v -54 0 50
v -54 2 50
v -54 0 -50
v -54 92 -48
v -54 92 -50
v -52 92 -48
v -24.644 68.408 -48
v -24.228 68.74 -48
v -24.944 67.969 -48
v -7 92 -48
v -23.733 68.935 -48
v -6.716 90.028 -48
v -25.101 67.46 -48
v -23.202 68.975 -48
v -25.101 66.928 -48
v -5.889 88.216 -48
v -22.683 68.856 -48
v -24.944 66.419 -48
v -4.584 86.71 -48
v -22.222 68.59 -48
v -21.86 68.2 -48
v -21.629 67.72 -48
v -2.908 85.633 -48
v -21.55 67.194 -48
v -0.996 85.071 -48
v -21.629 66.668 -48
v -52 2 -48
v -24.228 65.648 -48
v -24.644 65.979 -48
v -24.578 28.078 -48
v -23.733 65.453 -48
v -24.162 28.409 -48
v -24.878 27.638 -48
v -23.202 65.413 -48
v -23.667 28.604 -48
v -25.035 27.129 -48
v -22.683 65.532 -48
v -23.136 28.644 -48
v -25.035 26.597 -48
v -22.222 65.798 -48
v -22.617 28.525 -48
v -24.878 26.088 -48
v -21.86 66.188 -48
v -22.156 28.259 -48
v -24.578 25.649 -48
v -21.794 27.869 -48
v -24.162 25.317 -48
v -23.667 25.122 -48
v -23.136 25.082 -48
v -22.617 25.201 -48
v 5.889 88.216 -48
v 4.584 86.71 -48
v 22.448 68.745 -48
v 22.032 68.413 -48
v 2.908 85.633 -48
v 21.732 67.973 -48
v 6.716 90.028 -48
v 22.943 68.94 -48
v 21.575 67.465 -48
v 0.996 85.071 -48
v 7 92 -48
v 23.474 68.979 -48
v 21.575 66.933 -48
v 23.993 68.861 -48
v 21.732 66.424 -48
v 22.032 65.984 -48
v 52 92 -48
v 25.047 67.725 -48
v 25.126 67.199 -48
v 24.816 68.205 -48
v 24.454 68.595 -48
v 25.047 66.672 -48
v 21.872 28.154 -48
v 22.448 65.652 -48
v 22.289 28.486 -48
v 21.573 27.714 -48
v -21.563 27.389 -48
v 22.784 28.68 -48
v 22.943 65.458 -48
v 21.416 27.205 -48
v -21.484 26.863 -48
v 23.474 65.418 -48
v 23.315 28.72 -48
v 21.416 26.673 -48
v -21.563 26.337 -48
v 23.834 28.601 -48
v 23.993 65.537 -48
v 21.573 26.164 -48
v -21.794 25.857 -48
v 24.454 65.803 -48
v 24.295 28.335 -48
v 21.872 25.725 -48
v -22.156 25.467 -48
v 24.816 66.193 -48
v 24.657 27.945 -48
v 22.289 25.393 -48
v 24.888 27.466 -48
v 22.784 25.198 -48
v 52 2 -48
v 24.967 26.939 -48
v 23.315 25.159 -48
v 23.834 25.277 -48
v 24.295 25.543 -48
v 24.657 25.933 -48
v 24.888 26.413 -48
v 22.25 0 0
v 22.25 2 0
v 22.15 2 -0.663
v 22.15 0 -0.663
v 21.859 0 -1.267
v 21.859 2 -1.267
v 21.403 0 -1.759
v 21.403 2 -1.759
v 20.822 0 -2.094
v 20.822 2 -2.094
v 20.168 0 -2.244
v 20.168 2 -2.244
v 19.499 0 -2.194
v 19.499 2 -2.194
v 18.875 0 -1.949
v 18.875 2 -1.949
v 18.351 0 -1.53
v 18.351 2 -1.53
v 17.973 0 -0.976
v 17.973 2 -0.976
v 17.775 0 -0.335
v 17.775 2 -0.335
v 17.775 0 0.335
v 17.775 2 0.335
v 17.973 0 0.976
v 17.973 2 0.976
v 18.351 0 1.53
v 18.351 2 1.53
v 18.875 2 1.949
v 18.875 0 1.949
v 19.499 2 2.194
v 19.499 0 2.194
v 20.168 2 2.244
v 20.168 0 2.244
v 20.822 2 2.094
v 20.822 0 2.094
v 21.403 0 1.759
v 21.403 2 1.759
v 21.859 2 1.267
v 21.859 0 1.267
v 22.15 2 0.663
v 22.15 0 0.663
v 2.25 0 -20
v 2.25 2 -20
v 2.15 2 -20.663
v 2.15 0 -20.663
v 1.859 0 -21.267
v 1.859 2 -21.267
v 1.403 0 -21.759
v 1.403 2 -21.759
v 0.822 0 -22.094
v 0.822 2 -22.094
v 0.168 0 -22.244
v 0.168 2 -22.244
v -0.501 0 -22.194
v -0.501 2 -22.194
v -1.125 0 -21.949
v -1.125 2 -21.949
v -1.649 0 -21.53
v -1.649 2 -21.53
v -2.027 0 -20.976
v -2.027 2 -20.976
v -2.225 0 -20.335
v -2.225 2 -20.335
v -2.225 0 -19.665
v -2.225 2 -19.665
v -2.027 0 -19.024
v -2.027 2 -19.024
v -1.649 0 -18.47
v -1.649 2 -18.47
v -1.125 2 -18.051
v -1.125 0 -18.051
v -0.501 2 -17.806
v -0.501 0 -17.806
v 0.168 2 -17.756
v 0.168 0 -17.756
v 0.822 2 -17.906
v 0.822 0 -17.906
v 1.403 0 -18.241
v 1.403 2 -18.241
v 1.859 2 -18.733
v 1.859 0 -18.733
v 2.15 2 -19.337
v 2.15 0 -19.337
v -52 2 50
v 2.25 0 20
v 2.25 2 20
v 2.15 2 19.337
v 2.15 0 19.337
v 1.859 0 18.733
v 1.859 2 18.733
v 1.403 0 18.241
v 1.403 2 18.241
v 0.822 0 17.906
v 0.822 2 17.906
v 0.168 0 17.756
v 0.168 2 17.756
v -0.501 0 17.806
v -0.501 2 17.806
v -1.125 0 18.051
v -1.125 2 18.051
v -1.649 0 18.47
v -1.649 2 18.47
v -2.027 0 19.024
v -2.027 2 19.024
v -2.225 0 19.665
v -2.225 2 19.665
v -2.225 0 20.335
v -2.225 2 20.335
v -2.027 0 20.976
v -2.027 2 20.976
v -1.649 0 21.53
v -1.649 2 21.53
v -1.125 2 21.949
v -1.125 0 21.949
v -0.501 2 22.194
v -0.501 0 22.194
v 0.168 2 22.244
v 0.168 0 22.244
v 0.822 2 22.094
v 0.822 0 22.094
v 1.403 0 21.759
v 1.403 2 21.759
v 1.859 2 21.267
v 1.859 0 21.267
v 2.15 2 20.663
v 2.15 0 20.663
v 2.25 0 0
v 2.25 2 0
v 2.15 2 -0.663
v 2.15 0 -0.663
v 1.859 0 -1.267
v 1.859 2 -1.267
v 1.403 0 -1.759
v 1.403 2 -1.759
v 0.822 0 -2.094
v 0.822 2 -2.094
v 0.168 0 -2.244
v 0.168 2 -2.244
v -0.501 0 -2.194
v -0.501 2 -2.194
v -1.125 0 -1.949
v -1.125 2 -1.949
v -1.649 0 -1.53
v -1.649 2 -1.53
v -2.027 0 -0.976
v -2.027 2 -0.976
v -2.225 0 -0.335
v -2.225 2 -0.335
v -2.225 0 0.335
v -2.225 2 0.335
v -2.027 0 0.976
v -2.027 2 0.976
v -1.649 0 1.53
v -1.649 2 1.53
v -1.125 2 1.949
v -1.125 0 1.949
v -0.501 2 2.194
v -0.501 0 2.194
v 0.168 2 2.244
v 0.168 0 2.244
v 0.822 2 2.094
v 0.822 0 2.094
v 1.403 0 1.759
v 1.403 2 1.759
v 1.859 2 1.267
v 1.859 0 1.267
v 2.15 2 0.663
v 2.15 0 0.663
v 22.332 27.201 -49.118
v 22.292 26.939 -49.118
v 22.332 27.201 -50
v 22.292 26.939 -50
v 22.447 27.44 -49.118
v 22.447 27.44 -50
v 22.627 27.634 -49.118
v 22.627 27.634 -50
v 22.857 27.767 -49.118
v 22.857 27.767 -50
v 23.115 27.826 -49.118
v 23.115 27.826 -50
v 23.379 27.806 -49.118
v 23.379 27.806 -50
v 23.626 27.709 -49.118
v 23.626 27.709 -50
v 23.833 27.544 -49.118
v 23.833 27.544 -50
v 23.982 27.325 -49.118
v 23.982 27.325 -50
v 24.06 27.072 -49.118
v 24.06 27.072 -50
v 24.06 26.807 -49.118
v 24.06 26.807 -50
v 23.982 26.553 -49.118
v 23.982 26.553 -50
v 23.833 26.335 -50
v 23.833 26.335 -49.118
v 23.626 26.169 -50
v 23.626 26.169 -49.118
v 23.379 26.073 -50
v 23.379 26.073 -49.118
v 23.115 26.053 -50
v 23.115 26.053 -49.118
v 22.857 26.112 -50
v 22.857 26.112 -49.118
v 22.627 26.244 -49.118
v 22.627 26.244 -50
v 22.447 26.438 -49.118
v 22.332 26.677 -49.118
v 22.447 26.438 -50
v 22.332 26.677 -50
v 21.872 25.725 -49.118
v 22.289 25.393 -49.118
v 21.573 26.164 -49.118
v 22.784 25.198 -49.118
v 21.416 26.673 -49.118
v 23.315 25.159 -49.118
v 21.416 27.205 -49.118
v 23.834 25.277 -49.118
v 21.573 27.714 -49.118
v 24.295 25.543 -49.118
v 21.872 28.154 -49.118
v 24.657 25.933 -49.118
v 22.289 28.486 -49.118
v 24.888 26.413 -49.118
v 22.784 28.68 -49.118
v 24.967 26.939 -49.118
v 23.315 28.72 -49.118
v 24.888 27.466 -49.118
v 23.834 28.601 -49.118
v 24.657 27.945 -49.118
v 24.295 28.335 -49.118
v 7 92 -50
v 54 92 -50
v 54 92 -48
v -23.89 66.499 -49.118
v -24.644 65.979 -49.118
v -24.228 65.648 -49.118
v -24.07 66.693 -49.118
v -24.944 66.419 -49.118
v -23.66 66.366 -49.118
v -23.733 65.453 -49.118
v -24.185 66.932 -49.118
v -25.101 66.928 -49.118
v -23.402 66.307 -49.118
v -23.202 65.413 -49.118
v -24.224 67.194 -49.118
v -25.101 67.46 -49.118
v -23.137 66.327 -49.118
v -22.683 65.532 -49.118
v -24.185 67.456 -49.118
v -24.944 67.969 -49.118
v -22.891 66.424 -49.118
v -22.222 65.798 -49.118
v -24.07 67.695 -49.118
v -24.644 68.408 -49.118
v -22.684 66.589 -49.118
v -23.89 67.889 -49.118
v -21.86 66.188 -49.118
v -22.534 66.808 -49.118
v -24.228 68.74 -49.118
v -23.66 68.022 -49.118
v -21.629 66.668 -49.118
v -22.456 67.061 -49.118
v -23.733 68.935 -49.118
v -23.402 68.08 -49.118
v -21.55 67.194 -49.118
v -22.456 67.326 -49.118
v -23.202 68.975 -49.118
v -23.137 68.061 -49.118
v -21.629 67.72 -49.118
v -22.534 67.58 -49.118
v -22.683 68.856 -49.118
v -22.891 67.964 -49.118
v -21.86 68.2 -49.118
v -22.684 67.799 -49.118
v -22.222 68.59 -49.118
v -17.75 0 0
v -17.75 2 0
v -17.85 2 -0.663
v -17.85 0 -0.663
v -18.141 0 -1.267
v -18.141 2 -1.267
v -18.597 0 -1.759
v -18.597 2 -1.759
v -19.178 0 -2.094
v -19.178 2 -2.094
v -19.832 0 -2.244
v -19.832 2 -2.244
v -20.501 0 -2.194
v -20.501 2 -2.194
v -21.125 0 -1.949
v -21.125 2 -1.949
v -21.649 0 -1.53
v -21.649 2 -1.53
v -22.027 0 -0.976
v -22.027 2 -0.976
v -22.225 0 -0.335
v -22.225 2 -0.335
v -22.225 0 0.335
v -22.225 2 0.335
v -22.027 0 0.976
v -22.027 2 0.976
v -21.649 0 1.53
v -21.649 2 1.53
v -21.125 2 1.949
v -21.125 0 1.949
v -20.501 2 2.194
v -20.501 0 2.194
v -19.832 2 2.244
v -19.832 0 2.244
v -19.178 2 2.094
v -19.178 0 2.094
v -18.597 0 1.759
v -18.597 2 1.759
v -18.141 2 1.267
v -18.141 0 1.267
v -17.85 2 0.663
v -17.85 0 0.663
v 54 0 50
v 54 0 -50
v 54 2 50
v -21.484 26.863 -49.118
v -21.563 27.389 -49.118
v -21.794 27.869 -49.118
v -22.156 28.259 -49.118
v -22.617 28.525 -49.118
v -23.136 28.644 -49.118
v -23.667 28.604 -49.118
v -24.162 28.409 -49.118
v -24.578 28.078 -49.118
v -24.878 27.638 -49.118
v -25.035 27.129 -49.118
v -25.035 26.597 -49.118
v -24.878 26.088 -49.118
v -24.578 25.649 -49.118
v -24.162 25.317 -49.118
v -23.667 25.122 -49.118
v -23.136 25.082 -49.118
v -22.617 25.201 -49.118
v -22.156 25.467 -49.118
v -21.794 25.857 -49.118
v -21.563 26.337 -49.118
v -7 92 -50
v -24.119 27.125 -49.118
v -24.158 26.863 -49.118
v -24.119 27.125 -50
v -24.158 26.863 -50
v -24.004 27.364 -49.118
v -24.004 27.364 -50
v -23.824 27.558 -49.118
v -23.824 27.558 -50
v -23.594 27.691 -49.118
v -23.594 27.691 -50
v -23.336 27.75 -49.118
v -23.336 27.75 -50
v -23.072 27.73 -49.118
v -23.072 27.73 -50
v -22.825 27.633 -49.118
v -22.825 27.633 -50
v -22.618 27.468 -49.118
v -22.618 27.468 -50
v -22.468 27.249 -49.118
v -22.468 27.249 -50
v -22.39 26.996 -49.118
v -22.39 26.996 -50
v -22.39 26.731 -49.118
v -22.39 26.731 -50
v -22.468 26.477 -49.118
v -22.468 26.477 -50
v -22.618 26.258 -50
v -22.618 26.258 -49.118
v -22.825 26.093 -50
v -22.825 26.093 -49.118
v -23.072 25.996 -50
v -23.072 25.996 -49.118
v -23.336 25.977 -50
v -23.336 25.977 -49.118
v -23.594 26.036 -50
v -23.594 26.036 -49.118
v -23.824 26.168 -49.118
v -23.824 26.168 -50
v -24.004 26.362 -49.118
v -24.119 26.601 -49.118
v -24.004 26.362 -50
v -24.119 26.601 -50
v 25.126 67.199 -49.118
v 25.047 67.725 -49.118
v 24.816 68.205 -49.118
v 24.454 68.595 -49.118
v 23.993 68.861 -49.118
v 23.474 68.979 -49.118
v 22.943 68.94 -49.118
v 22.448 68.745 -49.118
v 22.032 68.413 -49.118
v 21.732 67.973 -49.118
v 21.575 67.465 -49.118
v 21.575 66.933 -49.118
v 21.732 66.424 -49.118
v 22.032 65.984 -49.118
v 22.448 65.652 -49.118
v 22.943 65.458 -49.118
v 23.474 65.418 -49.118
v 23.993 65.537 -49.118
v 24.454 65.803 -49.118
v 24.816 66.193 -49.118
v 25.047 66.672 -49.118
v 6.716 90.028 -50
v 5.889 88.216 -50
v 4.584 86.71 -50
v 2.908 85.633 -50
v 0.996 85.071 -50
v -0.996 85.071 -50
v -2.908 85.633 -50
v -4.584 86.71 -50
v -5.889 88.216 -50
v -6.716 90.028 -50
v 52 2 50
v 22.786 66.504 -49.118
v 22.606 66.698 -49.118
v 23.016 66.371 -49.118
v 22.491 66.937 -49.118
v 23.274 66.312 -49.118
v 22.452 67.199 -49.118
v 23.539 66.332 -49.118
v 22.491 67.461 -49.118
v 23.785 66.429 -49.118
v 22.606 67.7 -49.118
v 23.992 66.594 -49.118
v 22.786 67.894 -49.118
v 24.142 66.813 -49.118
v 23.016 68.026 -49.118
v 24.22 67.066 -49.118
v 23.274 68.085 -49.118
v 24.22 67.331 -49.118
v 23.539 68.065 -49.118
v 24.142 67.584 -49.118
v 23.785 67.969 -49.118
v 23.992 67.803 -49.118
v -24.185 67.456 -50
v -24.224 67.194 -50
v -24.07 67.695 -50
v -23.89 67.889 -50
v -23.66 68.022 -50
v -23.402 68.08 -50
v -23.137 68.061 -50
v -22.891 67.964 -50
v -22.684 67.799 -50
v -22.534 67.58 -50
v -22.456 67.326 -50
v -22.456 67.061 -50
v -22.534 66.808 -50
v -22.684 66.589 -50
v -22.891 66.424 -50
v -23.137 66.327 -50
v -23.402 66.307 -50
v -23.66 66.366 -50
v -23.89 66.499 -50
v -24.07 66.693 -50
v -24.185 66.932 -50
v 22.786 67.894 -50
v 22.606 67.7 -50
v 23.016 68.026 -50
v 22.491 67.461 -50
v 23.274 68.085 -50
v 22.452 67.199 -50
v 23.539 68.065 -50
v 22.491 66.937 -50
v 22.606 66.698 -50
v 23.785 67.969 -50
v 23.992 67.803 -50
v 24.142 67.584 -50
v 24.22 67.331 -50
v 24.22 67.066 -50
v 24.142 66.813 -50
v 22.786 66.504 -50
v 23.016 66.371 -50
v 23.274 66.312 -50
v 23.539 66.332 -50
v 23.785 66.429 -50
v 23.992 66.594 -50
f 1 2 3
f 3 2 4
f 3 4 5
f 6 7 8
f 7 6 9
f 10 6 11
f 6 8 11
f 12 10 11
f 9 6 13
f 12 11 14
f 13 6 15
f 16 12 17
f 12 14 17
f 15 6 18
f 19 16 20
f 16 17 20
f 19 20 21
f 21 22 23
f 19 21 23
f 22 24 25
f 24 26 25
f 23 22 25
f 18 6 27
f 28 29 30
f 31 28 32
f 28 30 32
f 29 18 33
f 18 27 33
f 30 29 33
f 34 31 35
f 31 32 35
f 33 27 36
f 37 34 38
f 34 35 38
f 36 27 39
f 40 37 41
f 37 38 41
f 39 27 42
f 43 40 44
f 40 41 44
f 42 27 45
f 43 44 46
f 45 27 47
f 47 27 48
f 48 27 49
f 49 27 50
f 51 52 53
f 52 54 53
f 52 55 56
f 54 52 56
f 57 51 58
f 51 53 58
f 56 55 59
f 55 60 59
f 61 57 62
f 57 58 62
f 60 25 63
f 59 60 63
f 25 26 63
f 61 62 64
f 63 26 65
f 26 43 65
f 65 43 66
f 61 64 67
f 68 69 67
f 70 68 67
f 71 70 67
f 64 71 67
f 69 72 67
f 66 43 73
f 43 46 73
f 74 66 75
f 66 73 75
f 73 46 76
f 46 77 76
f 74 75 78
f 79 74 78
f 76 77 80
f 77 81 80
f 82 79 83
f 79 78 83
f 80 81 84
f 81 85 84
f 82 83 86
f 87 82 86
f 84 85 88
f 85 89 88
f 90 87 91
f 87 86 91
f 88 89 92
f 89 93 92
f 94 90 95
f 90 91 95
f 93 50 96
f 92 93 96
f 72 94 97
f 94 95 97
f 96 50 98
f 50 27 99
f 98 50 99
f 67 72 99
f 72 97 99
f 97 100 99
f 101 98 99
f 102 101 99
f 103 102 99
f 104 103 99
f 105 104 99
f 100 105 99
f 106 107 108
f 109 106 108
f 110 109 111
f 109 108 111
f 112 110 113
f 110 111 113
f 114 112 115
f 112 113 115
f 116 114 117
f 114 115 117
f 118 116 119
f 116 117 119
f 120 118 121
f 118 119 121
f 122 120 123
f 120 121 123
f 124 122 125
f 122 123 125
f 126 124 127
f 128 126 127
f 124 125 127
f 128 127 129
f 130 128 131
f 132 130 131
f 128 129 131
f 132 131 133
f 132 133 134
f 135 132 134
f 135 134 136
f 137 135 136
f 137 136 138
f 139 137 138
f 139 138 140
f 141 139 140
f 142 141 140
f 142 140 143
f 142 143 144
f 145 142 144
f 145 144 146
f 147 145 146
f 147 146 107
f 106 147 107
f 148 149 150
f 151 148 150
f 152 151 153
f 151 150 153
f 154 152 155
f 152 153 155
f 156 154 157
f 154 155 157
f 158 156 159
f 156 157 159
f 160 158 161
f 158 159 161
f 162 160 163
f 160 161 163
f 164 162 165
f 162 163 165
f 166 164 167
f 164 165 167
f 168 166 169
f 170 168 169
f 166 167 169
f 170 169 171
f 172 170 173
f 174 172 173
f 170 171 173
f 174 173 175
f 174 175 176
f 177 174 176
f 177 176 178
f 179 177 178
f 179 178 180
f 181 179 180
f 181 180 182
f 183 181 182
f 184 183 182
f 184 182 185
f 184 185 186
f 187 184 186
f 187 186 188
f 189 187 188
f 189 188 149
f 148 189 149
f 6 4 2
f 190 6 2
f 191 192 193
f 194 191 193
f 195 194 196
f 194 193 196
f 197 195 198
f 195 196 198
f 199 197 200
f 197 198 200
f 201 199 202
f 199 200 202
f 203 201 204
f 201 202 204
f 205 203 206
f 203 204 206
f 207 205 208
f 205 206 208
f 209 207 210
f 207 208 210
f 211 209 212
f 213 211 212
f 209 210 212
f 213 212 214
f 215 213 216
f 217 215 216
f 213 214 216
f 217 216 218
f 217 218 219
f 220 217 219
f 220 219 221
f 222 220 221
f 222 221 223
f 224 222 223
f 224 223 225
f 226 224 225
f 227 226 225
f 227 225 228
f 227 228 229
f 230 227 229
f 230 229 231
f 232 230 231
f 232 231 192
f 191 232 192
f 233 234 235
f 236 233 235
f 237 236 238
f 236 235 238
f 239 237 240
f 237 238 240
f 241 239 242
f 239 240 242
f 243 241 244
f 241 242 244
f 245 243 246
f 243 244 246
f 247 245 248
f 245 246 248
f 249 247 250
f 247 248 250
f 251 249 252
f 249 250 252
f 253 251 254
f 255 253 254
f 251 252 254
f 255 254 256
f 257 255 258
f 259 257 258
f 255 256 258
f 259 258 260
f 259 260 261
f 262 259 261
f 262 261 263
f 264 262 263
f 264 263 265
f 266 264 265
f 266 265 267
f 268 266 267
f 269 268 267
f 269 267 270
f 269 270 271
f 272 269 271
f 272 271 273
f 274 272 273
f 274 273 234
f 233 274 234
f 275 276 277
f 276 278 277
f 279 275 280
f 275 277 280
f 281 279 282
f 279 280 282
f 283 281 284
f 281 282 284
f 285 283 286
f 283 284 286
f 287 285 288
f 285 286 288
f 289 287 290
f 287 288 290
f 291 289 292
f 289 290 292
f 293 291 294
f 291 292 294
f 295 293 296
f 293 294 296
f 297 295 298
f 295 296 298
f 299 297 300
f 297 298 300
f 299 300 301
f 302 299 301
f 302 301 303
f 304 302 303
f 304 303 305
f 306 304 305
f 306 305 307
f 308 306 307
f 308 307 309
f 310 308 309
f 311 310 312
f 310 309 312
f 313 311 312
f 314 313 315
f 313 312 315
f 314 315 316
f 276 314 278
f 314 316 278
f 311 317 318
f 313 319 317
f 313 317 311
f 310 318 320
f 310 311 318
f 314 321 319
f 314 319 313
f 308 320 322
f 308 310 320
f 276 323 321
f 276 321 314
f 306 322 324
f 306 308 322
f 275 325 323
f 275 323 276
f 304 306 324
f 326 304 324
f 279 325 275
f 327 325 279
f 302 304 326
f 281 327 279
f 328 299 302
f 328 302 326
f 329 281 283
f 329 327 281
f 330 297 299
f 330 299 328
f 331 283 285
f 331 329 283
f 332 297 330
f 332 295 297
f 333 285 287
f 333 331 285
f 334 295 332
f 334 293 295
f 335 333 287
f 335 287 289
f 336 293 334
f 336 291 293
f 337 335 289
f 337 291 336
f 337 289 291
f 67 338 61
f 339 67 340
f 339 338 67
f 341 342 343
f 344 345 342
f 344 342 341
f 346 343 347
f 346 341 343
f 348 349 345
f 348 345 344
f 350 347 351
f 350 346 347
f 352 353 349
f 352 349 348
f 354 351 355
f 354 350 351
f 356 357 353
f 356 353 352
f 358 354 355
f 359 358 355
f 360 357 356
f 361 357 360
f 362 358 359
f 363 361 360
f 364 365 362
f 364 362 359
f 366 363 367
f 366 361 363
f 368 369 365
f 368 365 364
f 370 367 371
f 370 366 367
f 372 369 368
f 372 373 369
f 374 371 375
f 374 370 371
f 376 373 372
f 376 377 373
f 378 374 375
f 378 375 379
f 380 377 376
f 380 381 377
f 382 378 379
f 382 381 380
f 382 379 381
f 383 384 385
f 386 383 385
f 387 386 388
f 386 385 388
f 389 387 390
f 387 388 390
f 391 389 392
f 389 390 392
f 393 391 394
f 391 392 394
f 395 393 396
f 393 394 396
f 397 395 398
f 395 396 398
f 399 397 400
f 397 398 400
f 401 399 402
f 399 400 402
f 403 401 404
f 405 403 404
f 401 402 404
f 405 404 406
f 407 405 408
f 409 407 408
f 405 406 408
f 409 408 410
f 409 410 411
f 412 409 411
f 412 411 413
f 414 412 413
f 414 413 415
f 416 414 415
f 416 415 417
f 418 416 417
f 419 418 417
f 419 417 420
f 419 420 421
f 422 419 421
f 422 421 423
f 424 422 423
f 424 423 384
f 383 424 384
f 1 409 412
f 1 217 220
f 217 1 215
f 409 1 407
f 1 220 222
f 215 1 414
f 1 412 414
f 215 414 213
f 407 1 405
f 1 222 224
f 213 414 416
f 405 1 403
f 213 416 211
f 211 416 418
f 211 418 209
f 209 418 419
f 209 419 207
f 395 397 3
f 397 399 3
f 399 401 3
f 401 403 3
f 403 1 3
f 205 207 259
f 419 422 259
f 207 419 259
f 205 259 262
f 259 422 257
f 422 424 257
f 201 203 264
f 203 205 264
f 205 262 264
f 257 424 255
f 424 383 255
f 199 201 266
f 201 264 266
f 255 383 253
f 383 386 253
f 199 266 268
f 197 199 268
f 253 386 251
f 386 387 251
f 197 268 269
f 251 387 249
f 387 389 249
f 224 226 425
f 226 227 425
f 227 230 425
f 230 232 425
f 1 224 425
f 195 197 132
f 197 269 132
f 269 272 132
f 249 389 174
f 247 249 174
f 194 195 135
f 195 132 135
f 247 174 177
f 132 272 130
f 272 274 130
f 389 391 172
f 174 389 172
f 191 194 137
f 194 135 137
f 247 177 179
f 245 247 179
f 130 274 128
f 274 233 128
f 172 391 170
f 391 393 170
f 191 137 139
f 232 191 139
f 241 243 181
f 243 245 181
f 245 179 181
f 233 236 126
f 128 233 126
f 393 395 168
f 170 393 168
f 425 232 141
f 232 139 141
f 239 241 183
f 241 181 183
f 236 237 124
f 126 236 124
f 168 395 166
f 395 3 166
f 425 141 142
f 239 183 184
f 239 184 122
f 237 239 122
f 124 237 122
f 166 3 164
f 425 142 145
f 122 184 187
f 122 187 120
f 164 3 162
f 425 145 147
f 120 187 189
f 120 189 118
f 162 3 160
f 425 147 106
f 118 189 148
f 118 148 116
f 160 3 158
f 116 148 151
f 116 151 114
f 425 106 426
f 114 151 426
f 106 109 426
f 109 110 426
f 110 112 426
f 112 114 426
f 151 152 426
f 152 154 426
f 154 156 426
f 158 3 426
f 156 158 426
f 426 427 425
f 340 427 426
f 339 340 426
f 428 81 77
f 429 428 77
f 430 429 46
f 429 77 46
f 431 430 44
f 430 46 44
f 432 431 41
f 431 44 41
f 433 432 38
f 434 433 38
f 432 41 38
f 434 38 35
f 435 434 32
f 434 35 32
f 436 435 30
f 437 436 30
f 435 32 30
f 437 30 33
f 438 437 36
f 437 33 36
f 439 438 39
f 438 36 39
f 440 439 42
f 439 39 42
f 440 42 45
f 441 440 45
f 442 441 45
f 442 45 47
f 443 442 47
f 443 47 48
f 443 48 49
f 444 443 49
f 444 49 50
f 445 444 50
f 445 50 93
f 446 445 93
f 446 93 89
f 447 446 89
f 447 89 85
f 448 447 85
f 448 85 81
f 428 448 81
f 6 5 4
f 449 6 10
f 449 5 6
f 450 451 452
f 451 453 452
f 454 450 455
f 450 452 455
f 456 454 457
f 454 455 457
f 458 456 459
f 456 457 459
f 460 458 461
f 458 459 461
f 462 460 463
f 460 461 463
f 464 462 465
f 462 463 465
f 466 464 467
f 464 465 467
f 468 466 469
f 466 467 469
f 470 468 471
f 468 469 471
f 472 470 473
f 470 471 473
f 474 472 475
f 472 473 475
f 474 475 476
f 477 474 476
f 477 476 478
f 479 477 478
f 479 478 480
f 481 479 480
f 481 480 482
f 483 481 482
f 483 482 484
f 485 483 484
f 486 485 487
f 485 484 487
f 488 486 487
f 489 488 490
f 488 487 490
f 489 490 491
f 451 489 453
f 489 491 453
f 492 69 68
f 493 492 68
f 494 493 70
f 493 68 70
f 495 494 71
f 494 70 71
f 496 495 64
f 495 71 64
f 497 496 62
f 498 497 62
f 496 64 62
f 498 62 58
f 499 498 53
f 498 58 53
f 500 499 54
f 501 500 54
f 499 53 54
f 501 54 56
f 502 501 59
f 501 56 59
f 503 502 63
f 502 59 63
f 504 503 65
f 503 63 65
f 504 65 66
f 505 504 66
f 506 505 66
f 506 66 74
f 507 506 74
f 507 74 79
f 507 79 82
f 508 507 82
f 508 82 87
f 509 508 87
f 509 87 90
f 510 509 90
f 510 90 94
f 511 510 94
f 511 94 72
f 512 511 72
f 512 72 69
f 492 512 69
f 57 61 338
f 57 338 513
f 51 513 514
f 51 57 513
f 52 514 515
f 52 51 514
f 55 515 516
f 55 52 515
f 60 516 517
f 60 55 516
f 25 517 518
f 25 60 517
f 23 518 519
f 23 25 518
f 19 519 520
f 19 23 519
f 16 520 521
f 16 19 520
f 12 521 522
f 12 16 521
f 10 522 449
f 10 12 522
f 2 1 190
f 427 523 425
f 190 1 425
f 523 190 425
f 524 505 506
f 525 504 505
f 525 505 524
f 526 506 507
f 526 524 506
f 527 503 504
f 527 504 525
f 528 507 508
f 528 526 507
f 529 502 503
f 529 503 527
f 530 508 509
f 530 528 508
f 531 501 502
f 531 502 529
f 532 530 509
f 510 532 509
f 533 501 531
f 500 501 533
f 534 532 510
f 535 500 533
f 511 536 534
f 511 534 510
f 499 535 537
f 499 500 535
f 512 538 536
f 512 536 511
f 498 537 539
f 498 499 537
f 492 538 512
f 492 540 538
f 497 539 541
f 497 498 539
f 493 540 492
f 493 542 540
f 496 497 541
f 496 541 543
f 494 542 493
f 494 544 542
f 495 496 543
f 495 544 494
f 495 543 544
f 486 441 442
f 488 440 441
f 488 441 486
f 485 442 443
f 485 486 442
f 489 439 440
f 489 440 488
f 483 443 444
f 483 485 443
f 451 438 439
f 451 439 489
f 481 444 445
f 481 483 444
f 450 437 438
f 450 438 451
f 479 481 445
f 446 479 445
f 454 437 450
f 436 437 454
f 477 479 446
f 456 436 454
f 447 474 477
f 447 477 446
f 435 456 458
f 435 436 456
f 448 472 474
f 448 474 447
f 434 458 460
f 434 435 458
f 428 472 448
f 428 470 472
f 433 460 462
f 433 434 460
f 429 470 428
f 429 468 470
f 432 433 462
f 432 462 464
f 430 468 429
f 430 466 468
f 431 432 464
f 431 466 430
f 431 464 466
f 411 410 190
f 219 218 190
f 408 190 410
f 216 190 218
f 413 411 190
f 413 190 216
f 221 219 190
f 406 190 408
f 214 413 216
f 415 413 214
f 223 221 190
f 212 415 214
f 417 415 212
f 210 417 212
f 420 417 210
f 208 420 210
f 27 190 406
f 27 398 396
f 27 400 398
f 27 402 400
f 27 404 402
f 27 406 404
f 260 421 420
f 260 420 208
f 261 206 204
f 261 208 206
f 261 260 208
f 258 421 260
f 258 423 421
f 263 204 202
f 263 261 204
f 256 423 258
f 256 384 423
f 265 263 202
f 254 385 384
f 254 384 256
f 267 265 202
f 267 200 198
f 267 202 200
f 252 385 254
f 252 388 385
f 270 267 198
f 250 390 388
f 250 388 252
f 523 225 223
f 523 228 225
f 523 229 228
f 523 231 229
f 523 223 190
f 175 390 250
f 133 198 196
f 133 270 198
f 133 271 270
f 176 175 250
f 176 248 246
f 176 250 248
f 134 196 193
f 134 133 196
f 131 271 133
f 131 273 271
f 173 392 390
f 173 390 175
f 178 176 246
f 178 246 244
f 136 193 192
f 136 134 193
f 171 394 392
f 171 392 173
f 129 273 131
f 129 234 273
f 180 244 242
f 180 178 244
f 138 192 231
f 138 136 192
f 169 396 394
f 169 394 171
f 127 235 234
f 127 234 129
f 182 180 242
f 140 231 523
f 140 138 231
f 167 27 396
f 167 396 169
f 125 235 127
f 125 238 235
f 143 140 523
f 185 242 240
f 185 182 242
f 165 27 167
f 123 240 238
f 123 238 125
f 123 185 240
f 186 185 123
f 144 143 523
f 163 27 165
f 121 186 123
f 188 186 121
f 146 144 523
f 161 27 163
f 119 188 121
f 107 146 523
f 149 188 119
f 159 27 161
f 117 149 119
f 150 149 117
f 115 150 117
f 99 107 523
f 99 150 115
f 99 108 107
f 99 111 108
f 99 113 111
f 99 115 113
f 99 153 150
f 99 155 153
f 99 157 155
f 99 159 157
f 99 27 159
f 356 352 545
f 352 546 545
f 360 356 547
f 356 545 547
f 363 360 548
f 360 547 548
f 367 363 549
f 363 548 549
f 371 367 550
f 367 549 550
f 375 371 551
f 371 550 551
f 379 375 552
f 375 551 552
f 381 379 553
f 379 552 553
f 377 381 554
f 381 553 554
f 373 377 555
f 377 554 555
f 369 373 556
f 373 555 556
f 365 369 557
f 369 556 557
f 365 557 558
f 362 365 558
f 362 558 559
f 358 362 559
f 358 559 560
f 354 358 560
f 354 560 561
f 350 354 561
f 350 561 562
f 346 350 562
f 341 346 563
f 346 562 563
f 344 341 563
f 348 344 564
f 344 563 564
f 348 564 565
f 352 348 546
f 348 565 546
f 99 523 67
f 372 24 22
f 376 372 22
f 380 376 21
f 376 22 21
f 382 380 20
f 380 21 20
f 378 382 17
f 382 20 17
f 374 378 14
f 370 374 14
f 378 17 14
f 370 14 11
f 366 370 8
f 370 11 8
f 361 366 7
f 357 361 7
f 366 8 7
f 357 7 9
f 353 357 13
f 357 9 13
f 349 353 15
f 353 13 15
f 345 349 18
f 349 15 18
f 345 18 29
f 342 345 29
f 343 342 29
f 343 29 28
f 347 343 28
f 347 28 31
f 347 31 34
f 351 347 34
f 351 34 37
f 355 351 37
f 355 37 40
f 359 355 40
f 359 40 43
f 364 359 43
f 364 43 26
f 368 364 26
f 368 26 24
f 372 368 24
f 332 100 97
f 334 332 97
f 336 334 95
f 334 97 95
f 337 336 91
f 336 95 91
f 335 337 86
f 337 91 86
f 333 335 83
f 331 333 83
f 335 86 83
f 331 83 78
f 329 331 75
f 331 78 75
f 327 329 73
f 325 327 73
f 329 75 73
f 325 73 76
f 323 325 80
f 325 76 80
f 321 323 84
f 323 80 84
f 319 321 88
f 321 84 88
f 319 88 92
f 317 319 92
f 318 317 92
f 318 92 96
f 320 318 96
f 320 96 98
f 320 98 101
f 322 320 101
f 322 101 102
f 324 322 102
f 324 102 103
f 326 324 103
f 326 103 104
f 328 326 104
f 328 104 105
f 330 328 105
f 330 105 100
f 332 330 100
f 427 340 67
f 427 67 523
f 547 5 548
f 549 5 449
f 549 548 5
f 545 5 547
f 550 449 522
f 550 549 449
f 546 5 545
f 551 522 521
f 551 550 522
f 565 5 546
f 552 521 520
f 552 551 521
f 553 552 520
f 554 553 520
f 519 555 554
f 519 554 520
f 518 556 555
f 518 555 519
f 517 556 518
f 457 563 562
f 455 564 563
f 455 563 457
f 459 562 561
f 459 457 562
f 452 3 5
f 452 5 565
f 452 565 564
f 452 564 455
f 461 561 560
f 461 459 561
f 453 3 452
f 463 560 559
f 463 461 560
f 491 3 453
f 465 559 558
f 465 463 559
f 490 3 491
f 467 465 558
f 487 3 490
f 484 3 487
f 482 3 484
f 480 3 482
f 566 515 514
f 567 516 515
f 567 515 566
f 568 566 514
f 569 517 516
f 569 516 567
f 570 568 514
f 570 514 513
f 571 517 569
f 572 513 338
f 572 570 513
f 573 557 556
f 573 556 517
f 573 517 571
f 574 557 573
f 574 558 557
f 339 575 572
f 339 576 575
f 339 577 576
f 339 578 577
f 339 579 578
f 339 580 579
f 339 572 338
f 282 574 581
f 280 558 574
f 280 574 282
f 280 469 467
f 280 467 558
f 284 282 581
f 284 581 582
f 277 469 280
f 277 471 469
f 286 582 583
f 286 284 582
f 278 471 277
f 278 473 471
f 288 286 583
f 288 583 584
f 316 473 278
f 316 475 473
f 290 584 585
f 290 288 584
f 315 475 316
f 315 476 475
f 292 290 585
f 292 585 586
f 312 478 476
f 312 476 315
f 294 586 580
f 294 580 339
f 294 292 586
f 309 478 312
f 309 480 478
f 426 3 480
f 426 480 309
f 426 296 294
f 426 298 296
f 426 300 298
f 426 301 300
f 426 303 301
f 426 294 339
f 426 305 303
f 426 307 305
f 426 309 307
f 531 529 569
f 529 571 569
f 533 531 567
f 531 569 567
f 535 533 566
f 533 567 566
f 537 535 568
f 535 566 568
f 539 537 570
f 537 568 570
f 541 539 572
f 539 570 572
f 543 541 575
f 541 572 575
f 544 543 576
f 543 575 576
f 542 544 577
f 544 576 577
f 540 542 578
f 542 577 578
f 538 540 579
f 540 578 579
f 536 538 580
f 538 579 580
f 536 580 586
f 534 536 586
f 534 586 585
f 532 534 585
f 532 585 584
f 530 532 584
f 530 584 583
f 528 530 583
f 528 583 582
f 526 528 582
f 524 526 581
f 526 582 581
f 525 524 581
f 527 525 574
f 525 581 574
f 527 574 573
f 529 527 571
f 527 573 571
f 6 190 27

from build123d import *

# Parameters (mm, degrees)
CROQUIS1_W                                           = 108
CROQUIS1_H                                           = 100
SALIENTE_EXTRUIR2_DEPTH                              = 2
CROQUIS3_W                                           = 108
CROQUIS3_H                                           = 2
SALIENTE_EXTRUIR3_DEPTH                              = 90
CORTAR_EXTRUIR1_DEPTH                                = 90
TALADRO_DE_MARGEN_PARA_M42_D                         = 4.5
TALADRO_DE_MARGEN_PARA_M42_DEPTH                     = 10
TALADRO_DE_MARGEN_PARA_M42_TIP                       = 1.351936393
SALIENTE_EXTRUIR4_DEPTH                              = 2
SALIENTE_EXTRUIR5_DEPTH                              = 2
REFRENTADO_PARA_TORNILLO_CON_CABEZA_TRON_D           = 1.778
REFRENTADO_PARA_TORNILLO_CON_CABEZA_TRON_DEPTH       = 10
REFRENTADO_PARA_TORNILLO_CON_CABEZA_TRON_CBORE_D     = 3.57124
REFRENTADO_PARA_TORNILLO_CON_CABEZA_TRON_CBORE_DEPTH = 1.1176
REFRENTADO_PARA_TORNILLO_CON_CABEZA_TRON_TIP         = 0.53416509


with BuildPart() as part:
    # Croquis1 → Saliente-Extruir2 (new body)
    with BuildSketch(Plane(origin=(0, 0, 0), x_dir=(1, 0, 0), z_dir=(0, 1, 0))):
        Rectangle(CROQUIS1_W, CROQUIS1_H)
    extrude(amount=SALIENTE_EXTRUIR2_DEPTH)

    # Croquis3 → Saliente-Extruir3 (add)
    with BuildSketch(Plane(origin=(0, 2, 0), x_dir=(1, 0, 0), z_dir=(0, 1, 0))):
        with Locations((0, 49)):
            Rectangle(CROQUIS3_W, CROQUIS3_H)
    extrude(amount=SALIENTE_EXTRUIR3_DEPTH)

    # Croquis4 → Cortar-Extruir1 (cut)
    with BuildSketch(Plane.XY.offset(-48)):
        with BuildLine():
            Line((-7, 92), (7, 92))
            ThreePointArc((7, 92), (0, 85), (-7, 92))
        make_face()
    extrude(amount=-CORTAR_EXTRUIR1_DEPTH, mode=Mode.SUBTRACT)

    # Taladro de margen para M42
    with Locations(Plane(origin=(0, 0, 0), x_dir=(-1, 0, 0), z_dir=(0, -1, 0))):
        with Locations((0, 20), (-20, 0), (0, -20), (20, 0), (0, 0)):
            Hole(TALADRO_DE_MARGEN_PARA_M42_D / 2, depth=TALADRO_DE_MARGEN_PARA_M42_DEPTH)
            with Locations((0, 0, -(TALADRO_DE_MARGEN_PARA_M42_DEPTH + TALADRO_DE_MARGEN_PARA_M42_TIP / 2))):  # 118° drill point
                Cone(0, TALADRO_DE_MARGEN_PARA_M42_D / 2, TALADRO_DE_MARGEN_PARA_M42_TIP, mode=Mode.SUBTRACT)

    # Croquis19 → Saliente-Extruir4 (add)
    with BuildSketch(Plane(origin=(54, 0, 0), x_dir=(0, 0, -1), z_dir=(1, 0, 0))):
        Polygon((48, 92), (-50, 2), (48, 2), align=None)
    extrude(amount=-SALIENTE_EXTRUIR4_DEPTH)

    # Croquis20 → Saliente-Extruir5 (add)
    with BuildSketch(Plane.ZY.offset(54)):
        Polygon((50, 2), (-48, 2), (-48, 92), align=None)
    extrude(amount=-SALIENTE_EXTRUIR5_DEPTH)

    # Refrentado para tornillo con cabeza troncocónica de #01
    with Locations(Plane.XY.offset(-48)):
        with Locations((-23.335241647, 67.193959118), (23.34076456, 67.198738562), (-23.269344277, 26.863067453), (23.181350949, 26.939215525)):
            CounterBoreHole(REFRENTADO_PARA_TORNILLO_CON_CABEZA_TRON_D / 2, REFRENTADO_PARA_TORNILLO_CON_CABEZA_TRON_CBORE_D / 2, REFRENTADO_PARA_TORNILLO_CON_CABEZA_TRON_CBORE_DEPTH, depth=REFRENTADO_PARA_TORNILLO_CON_CABEZA_TRON_DEPTH)
            with Locations((0, 0, -(REFRENTADO_PARA_TORNILLO_CON_CABEZA_TRON_DEPTH + REFRENTADO_PARA_TORNILLO_CON_CABEZA_TRON_TIP / 2))):  # 118° drill point
                Cone(0, REFRENTADO_PARA_TORNILLO_CON_CABEZA_TRON_D / 2, REFRENTADO_PARA_TORNILLO_CON_CABEZA_TRON_TIP, mode=Mode.SUBTRACT)


solid = part.part
